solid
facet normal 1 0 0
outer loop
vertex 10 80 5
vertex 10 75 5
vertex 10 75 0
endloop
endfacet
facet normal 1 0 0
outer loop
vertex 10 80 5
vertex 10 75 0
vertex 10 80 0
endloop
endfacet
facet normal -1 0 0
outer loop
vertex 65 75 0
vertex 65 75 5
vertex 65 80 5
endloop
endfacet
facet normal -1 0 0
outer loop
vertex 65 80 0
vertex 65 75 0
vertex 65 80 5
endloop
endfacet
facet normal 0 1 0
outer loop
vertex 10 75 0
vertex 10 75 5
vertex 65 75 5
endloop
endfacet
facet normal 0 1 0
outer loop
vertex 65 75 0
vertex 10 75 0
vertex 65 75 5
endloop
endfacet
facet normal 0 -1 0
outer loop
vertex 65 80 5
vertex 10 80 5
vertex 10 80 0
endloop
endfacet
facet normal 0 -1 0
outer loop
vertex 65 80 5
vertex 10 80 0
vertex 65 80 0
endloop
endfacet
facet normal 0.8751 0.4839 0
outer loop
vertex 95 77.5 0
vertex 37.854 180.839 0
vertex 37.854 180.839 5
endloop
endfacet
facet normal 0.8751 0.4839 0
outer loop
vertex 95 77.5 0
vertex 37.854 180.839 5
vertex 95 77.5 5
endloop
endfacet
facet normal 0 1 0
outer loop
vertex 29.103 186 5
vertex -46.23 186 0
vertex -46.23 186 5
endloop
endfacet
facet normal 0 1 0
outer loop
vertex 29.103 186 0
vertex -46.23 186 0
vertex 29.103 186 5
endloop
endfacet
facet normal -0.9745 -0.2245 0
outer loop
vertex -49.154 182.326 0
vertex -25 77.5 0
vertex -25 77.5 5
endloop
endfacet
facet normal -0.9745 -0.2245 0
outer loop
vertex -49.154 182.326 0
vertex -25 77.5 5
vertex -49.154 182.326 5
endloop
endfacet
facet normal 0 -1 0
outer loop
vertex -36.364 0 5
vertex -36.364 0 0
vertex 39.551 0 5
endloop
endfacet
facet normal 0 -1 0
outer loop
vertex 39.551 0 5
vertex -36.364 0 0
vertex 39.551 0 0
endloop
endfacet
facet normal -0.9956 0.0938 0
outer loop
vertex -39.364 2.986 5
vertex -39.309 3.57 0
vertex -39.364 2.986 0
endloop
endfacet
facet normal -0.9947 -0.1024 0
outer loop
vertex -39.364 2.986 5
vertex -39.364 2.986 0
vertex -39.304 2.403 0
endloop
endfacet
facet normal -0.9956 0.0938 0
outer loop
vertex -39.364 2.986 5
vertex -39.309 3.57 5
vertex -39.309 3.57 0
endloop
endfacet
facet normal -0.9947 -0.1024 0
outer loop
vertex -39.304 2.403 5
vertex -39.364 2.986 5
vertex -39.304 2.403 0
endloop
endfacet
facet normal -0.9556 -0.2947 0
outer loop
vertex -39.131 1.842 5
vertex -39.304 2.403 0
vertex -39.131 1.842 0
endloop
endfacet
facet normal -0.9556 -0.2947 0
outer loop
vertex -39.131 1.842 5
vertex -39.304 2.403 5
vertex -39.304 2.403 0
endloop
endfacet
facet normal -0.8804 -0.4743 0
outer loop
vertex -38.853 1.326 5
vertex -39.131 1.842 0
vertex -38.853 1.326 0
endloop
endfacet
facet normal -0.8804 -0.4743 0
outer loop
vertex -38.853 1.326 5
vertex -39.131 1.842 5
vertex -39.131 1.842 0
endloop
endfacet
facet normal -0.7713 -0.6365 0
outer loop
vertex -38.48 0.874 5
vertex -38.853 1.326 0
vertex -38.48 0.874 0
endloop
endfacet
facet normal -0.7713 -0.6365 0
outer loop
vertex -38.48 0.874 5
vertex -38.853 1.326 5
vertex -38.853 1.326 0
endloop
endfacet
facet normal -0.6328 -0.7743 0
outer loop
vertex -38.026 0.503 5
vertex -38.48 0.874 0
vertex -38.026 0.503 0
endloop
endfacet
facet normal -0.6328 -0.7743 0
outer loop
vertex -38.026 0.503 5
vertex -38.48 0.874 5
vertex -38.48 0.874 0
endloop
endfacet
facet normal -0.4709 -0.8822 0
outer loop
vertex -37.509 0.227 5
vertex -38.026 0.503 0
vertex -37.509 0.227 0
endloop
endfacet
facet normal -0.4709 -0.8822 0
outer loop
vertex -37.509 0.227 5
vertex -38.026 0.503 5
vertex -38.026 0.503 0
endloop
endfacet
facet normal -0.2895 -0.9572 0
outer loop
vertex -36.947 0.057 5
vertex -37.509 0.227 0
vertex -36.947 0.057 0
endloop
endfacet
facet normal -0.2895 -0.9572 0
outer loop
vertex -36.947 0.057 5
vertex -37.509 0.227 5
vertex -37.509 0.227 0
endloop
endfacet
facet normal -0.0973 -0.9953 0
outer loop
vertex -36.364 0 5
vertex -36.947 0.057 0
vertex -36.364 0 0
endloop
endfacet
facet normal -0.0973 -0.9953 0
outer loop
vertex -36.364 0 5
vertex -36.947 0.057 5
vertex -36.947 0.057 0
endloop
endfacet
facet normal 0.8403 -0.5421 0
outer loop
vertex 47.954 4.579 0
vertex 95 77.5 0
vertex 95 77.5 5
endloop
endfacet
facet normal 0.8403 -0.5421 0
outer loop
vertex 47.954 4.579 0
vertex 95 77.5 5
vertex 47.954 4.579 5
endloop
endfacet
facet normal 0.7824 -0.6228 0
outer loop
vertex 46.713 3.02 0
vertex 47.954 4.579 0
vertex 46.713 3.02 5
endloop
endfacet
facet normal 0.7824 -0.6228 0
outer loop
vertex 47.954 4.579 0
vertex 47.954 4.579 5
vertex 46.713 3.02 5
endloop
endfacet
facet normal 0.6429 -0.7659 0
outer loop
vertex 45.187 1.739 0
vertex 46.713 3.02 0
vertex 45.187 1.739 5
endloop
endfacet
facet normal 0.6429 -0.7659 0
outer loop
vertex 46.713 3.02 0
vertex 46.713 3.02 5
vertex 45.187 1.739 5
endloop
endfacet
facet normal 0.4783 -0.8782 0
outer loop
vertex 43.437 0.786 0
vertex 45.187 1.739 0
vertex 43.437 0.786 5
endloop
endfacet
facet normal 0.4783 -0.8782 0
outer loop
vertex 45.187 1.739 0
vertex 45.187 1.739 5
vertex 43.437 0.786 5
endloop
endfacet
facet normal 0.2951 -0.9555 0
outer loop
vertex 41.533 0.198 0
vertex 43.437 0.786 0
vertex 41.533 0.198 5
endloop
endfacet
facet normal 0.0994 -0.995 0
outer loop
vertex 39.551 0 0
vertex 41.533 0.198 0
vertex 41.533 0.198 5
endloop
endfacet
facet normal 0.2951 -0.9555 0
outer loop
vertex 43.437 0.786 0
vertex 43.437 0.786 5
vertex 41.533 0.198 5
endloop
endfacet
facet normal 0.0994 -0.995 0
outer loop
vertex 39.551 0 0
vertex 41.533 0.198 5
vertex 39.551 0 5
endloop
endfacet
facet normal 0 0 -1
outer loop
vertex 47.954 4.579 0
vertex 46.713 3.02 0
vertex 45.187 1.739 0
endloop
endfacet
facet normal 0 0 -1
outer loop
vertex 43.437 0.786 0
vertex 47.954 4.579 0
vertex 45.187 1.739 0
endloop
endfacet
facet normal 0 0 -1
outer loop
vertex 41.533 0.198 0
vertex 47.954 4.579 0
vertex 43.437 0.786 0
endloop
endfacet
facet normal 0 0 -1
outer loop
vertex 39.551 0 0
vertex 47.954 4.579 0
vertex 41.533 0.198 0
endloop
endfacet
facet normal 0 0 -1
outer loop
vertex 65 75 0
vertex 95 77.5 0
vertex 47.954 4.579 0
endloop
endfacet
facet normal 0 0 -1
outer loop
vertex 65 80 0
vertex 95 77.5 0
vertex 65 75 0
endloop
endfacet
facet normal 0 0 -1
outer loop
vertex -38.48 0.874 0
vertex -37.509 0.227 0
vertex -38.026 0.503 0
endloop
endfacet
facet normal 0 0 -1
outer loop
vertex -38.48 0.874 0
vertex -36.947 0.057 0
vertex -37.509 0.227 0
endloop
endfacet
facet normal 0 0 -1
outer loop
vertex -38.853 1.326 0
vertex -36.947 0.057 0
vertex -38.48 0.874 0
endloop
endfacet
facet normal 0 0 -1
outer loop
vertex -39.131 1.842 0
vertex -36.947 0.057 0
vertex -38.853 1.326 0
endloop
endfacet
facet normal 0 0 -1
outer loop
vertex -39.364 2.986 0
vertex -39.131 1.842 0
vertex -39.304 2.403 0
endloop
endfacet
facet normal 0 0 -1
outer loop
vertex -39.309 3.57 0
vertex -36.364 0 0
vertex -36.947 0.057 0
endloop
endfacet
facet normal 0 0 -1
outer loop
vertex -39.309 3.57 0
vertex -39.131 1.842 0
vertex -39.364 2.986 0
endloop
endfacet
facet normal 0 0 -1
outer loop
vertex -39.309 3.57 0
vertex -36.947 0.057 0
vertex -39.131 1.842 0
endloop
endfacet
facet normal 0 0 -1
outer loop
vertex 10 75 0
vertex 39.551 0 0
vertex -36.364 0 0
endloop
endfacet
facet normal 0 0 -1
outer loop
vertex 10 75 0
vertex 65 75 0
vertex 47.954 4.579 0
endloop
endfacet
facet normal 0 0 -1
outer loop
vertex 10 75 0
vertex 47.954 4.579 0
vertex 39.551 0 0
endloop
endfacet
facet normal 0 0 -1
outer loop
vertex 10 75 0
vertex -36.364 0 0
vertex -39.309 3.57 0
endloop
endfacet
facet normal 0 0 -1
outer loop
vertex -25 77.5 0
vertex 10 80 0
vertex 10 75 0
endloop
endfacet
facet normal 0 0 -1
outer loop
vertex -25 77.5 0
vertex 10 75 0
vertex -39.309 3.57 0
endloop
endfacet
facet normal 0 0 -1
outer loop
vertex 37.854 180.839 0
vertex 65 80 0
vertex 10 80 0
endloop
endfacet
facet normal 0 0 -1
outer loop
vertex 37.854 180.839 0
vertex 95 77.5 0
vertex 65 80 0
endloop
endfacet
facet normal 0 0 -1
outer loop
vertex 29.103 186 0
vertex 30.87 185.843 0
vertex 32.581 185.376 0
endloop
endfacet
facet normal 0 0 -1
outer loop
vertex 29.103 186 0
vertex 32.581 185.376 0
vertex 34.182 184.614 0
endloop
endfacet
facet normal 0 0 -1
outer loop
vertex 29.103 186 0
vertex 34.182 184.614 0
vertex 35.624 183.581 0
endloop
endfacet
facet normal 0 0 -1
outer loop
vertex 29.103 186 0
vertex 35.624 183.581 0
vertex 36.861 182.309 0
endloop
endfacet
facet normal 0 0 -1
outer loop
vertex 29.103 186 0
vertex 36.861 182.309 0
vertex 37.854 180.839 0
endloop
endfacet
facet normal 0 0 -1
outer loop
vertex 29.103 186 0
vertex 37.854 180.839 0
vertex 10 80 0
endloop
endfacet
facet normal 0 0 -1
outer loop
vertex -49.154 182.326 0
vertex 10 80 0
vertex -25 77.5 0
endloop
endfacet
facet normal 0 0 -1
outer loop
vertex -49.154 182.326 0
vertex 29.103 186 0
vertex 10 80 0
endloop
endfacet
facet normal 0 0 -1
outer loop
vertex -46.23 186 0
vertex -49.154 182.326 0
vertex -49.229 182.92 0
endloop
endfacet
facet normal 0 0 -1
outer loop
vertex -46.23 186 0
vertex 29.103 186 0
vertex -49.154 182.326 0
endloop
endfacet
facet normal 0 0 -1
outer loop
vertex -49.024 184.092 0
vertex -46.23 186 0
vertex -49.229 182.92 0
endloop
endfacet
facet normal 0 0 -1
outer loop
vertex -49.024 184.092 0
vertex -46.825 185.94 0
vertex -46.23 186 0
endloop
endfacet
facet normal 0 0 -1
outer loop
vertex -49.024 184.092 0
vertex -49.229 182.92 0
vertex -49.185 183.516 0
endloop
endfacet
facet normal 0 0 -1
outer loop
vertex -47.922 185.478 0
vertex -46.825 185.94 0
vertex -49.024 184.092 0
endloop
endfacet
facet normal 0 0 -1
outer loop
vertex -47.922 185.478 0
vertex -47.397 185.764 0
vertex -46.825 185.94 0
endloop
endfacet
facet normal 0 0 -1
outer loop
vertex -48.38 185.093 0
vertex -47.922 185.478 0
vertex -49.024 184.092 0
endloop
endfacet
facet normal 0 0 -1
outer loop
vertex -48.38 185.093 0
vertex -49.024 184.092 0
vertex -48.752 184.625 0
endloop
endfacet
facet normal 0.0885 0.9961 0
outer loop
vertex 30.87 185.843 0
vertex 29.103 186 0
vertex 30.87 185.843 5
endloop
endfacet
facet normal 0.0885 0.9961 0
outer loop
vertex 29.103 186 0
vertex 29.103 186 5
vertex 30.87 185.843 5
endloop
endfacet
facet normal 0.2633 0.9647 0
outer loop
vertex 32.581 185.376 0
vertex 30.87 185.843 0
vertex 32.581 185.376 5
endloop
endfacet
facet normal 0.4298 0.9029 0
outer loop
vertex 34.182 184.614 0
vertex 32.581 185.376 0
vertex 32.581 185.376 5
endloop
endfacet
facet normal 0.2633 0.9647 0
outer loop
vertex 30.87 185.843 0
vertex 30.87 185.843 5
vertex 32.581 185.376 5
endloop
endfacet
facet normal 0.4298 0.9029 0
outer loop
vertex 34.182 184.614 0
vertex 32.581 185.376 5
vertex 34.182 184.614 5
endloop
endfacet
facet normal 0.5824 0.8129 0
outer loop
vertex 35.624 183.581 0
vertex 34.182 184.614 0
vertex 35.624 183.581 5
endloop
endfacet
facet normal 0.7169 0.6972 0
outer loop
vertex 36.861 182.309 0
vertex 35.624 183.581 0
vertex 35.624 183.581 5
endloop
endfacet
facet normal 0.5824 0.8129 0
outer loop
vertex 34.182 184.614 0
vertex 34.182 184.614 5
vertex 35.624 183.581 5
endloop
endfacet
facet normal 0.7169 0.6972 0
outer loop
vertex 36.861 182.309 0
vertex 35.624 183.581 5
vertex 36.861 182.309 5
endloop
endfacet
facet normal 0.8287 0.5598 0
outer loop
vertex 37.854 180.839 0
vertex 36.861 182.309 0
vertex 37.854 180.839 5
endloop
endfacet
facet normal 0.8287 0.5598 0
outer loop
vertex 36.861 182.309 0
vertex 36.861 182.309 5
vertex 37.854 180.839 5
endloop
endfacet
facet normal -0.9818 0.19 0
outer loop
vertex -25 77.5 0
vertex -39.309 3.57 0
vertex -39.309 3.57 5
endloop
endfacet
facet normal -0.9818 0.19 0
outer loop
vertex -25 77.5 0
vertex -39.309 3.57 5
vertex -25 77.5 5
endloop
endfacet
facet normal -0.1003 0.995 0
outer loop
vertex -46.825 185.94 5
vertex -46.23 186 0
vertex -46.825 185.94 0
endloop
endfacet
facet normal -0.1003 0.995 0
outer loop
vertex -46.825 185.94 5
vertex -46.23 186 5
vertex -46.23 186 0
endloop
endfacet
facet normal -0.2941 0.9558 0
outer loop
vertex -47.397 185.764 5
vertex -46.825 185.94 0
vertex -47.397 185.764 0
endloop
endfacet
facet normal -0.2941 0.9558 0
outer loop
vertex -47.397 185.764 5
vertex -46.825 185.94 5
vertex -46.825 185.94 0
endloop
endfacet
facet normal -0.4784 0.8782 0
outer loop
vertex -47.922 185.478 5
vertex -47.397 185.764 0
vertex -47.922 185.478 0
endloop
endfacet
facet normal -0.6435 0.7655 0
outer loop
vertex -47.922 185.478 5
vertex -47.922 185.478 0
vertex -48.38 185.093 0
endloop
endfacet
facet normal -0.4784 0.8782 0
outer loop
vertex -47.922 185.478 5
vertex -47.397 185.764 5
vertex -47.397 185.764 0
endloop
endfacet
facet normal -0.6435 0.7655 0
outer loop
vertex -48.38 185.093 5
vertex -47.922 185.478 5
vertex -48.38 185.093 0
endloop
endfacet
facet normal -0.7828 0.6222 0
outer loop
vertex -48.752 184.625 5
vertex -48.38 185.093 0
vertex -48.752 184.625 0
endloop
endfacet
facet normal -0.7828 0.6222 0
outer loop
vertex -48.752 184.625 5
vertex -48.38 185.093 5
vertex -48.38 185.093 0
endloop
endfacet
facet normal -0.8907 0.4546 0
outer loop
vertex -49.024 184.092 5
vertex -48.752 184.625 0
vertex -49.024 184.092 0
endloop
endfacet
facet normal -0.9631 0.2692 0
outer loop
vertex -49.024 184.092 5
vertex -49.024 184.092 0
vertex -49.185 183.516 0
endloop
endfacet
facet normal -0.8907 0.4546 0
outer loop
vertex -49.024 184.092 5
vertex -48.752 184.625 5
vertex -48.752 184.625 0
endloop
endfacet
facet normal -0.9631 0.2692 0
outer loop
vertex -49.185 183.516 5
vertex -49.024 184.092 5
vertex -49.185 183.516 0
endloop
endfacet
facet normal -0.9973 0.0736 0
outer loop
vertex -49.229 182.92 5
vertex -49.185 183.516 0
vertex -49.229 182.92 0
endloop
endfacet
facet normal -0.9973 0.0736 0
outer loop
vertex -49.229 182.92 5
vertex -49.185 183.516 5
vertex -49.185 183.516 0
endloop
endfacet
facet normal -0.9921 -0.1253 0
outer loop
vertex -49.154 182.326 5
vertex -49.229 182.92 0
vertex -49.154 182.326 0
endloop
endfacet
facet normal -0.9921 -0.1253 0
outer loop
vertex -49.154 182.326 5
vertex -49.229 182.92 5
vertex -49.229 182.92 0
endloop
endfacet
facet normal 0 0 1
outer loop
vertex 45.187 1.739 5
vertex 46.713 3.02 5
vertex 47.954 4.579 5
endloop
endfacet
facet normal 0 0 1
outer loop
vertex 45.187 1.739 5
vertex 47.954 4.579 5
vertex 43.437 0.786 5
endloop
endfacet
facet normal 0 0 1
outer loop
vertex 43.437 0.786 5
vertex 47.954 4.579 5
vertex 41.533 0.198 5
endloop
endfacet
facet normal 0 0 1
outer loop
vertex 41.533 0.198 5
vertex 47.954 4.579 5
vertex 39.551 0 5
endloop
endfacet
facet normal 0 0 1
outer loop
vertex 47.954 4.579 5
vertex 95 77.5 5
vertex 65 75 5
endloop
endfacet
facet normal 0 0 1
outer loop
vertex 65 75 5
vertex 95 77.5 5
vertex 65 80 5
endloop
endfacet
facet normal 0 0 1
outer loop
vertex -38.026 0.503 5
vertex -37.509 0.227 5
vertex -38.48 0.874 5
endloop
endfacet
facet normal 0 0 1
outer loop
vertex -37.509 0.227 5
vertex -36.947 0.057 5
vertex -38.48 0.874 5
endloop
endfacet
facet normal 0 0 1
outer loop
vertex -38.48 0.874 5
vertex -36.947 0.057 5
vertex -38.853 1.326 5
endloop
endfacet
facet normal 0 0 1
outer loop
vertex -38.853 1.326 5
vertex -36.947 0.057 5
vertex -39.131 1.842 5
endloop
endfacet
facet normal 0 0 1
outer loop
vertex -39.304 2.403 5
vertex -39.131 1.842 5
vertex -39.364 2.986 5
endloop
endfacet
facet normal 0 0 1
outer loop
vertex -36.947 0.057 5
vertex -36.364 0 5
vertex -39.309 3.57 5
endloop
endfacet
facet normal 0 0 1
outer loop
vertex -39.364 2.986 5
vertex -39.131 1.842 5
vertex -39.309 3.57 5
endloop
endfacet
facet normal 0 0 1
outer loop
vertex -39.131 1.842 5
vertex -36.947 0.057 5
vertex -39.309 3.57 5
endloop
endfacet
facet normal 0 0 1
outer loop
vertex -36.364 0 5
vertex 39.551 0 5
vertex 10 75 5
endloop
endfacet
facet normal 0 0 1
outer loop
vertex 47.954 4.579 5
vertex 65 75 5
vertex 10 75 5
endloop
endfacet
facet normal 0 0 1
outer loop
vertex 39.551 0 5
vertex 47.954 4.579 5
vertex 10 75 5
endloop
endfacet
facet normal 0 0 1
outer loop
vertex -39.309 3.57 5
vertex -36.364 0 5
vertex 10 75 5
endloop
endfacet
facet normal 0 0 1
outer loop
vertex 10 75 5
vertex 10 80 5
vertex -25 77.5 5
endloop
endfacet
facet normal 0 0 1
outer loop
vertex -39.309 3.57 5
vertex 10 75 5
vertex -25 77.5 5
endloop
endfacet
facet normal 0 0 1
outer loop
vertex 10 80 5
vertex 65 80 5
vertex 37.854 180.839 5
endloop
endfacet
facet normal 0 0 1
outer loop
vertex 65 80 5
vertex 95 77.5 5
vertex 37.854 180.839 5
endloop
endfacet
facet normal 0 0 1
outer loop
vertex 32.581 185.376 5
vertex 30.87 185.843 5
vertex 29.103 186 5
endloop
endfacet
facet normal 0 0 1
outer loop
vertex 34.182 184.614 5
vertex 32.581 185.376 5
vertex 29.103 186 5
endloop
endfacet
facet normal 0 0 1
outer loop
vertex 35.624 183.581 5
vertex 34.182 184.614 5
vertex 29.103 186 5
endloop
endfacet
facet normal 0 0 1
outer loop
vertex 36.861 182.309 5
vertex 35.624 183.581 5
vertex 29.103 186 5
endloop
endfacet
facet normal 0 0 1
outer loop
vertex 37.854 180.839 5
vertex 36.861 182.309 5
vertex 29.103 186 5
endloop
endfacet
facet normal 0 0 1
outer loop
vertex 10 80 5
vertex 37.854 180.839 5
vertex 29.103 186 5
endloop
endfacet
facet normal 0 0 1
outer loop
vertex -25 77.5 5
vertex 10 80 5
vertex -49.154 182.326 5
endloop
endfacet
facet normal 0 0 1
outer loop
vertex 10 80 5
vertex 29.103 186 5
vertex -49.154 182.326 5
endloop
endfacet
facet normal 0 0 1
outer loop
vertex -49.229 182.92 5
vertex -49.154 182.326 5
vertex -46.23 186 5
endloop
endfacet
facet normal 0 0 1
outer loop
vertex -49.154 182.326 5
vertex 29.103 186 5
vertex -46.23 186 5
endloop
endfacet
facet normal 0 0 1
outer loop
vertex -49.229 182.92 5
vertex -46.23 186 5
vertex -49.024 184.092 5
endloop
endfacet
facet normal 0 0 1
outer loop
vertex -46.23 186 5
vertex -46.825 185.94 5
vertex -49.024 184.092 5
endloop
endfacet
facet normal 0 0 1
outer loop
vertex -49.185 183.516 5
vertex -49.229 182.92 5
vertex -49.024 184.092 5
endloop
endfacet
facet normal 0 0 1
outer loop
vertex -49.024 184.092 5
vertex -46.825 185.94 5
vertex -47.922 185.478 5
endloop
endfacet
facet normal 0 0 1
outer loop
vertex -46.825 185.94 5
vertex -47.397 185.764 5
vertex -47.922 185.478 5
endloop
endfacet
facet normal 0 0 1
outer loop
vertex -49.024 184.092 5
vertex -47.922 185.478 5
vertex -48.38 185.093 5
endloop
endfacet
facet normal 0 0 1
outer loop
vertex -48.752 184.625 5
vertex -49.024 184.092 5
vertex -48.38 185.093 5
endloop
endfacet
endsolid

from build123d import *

# Parameters (mm, degrees)
GRUNDPLATTE_DEPTH      = 5
SKIZZE2_W              = 55
SKIZZE2_H              = 5
NUTH_HENLEITWERK_DEPTH = 15
VERRUNDUNG1_R          = 10
VERRUNDUNG2_R          = 3


with BuildPart() as part:
    # Skizze1 → Grundplatte (new body)
    with BuildSketch(Plane.XY):
        Polygon((-50, 186), (35, 186), (95, 77.5), (45, 0), (0, 0), (-40, 0), (-25, 77.5), align=None)
    extrude(amount=GRUNDPLATTE_DEPTH)

    # Skizze2 → NutHöhenleitwerk (cut)
    with BuildSketch(Plane.XY.offset(5)):
        with Locations((37.5, 77.5)):
            Rectangle(SKIZZE2_W, SKIZZE2_H)
    extrude(amount=-NUTH_HENLEITWERK_DEPTH, mode=Mode.SUBTRACT)

    # Verrundung1
    verrundung1_edges = [part.edges().sort_by_distance(p)[0] for p in [
        (35, 186, 2.5),
        (45, 0, 2.5),
    ]]
    fillet(verrundung1_edges, radius=VERRUNDUNG1_R)

    # Verrundung2
    verrundung2_edges = [part.edges().sort_by_distance(p)[0] for p in [
        (-50, 186, 2.5),
        (-40, 0, 2.5),
    ]]
    fillet(verrundung2_edges, radius=VERRUNDUNG2_R)


solid = part.part
